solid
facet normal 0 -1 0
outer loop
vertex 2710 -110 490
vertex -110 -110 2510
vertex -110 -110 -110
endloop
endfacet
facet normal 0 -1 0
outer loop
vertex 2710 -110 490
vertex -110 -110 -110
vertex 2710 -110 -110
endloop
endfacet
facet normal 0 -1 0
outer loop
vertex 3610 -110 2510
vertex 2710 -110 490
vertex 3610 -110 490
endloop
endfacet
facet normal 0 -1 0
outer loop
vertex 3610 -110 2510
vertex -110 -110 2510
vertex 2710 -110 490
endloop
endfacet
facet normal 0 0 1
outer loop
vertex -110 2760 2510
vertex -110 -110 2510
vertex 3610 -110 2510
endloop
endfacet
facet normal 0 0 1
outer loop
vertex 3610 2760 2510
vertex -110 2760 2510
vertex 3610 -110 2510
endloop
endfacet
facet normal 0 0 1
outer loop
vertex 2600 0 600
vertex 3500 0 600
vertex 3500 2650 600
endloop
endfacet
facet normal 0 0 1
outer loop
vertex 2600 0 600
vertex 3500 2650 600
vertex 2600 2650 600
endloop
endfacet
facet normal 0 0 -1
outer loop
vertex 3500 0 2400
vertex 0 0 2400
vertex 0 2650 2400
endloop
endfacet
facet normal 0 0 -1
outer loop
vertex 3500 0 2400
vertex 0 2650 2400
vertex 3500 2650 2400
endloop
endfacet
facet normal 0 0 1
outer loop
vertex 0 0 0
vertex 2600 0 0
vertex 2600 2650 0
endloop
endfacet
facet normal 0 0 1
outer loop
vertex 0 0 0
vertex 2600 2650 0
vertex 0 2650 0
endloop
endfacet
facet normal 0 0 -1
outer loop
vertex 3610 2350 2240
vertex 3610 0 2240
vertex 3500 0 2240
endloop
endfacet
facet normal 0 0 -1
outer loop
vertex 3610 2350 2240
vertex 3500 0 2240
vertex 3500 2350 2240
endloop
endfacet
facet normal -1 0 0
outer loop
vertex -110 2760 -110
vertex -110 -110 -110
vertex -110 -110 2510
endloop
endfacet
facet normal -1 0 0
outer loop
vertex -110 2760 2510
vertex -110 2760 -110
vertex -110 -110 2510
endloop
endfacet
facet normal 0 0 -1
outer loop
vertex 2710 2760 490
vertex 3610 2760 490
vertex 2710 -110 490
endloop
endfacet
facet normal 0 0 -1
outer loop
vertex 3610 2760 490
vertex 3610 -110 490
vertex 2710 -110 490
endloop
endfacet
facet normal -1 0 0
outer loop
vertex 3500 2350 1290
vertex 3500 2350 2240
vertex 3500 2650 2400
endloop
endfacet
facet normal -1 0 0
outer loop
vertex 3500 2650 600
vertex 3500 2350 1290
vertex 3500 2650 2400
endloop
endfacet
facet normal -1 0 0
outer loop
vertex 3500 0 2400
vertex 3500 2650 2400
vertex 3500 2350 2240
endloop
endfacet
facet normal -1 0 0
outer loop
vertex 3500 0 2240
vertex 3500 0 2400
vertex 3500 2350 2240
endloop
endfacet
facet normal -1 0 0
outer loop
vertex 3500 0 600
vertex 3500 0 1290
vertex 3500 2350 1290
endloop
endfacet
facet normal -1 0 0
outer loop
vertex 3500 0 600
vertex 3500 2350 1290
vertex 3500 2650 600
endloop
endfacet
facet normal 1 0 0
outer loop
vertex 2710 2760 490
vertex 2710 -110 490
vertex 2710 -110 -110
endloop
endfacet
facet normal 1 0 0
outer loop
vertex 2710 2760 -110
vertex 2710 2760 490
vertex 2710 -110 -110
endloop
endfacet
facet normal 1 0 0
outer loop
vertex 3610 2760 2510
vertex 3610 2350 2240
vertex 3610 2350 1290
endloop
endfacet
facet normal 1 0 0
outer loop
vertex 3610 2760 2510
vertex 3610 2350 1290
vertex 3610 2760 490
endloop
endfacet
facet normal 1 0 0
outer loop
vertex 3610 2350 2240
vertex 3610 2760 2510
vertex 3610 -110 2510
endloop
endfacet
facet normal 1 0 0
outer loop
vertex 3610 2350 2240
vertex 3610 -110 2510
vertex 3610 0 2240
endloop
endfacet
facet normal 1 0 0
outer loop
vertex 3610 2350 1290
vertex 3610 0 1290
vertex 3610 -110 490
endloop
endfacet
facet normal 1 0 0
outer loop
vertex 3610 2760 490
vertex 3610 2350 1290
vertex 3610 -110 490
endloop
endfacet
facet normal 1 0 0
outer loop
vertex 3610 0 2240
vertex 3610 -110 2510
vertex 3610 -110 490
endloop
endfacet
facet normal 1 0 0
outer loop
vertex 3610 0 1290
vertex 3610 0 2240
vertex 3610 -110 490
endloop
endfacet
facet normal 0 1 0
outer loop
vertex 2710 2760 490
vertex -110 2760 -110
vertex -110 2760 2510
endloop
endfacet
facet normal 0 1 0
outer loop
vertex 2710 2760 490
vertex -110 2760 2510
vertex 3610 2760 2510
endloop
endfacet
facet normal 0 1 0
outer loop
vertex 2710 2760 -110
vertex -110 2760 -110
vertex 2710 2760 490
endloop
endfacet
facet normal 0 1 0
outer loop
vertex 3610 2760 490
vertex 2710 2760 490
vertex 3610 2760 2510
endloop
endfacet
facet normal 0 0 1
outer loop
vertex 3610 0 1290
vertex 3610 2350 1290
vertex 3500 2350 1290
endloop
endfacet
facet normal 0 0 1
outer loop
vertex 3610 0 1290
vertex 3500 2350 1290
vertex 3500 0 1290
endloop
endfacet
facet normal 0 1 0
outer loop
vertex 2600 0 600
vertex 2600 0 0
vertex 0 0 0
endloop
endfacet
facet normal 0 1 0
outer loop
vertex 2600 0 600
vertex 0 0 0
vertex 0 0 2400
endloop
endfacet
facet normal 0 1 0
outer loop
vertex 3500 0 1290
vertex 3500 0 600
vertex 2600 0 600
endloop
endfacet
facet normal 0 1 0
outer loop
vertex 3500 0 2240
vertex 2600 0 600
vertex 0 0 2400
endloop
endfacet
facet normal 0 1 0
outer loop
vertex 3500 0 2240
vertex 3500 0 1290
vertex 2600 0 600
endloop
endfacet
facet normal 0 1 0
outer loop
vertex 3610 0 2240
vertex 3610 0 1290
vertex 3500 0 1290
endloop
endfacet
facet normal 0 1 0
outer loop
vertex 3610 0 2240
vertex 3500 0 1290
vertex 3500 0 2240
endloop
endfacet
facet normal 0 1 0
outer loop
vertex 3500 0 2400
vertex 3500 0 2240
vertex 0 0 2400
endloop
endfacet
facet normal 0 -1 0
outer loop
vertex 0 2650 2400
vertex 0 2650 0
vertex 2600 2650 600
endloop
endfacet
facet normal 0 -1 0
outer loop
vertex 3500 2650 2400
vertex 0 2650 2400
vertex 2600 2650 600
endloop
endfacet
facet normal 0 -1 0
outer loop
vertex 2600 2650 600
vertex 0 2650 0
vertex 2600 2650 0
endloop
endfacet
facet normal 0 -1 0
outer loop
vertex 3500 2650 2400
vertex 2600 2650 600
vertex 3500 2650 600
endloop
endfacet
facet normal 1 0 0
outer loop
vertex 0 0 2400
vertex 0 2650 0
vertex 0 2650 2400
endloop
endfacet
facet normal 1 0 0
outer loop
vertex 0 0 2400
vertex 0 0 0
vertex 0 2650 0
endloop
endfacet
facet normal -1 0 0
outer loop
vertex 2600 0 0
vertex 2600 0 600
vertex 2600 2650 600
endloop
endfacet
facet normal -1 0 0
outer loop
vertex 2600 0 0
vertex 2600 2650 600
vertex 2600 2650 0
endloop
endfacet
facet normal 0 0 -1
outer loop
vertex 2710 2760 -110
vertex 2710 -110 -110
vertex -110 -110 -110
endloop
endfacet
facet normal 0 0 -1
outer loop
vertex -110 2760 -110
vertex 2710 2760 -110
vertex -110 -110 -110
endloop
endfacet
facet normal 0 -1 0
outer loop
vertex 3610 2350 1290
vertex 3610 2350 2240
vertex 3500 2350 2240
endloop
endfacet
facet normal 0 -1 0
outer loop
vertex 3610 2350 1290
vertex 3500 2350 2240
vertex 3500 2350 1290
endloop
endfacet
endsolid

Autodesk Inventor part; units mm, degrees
sketch "草图1" plane through (0, 0, 0) normal (0, 1, 0) x (-1, 0, 0)
  line L0 (0, 0) -> (0, 2400)
  line L1 (0, 2400) -> (-3500, 2400)
  line L2 (-3500, 2400) -> (-3500, 600)
  line L3 (-3500, 600) -> (-2600, 600)
  line L4 (-2600, 600) -> (-2600, 0)
  line L5 (-2600, 0) -> (0, 0)
  line L6 (110, 2510) -> (110, -110)
  line L7 (110, -110) -> (-2710, -110)
  line L8 (-2710, -110) -> (-2710, 490)
  line L9 (-2710, 490) -> (-3610, 490)
  line L10 (-3610, 490) -> (-3610, 2510)
  line L11 (-3610, 2510) -> (110, 2510)
  dimension "d0" = 2400
  dimension "d1" = 3500
  dimension "d2" = 1800
  dimension "d3" = 900
  dimension "d4" = 600
  dimension "d5" = 110
extrude "拉伸1" add sketch "草图1" along normal blind 2650
sketch "草图2" plane through (0, 0, 0) normal (0, -1, 0) x (1, 0, 0)
  line L0 (3610, 2510) -> (3610, 490) projected
  line L1 (-110, 2510) -> (3610, 2510) projected
  line L2 (-110, -110) -> (-110, 2510) projected
  line L3 (2710, -110) -> (-110, -110) projected
  line L4 (2710, 490) -> (2710, -110) projected
  line L5 (3610, 490) -> (2710, 490) projected
  point P0 (0, 0)
extrude "拉伸2" add sketch "草图2" along normal blind 110
sketch "草图3" plane through (0, 2650, 0) normal (0, 1, 0) x (1, 0, 0)
  line L0 (-110, 110) -> (-110, -2510) projected
  line L1 (-110, -2510) -> (3610, -2510) projected
  line L2 (3610, -2510) -> (3610, -490) projected
  line L3 (3610, -490) -> (2710, -490) projected
  line L4 (2710, -490) -> (2710, 110) projected
  line L5 (2710, 110) -> (-110, 110) projected
  point P0 (0, 0)
extrude "拉伸3" add sketch "草图3" along normal blind 110
sketch "草图4" plane through (3610, -110, 2510) normal (1, 0, 0) x (0, 0, -1)
  line L0 (270, 2460) -> (1220, 2460)
  line L1 (1220, 2460) -> (1220, 110)
  line L2 (1220, 110) -> (270, 110)
  line L3 (270, 110) -> (270, 2460)
  line L4 (2020, 0) -> (2020, 2870) projected
  line L5 (0, 2870) -> (2020, 2870) projected
  point P0 (2510, 110)
  dimension "d12" = 950
  dimension "d13" = 2350
  dimension "d14" = 800
  dimension "d15" = 410
extrude "拉伸4" cut sketch "草图4" against normal blind 110
sketch "草图5" plane through (0, 2760, 0) normal (0, 1, 0) x (1, 0, 0)
  line L0 (-110, -2510) -> (3610, -2510) projected
  line L1 (3610, -2510) -> (3610, -490) projected
  line L2 (3610, -490) -> (2710, -490) projected
  line L3 (2710, -490) -> (2710, 110) projected
  line L4 (2710, 110) -> (-110, 110) projected
  line L5 (-110, 110) -> (-110, -2510) projected
  point P0 (0, 0)
extrude "拉伸5" [suppressed]
ref_plane "工作平面1" through (2600, -110, 490) normal (1, 0, 0) x (0, 0, -1)
ref_plane "工作平面2" through (0, -110, -110) normal (-1, 0, 0) x (0, 0, 1)
ref_plane "工作平面3" through (2710, -110, 0) normal (0, 0, -1) x (-1, 0, 0)
ref_plane "工作平面4" through (0, 0, 0) normal (0, -1, 0) x (1, 0, 0)
ref_plane "工作平面5" through (-110, -110, 2400) normal (0, 0, 1) x (1, 0, 0)
ref_plane "工作平面6" through (1810, -110, 2510) normal (1, 0, 0) x (0, 0, -1)
ref_plane "工作平面7" through (0, 1500, 0) normal (0, -1, 0) x (1, 0, 0)
ref_plane "工作平面8" through (-110, -110, 1100) normal (0, 0, 1) x (1, 0, 0)
ref_plane "工作平面9" through (0, 2650, 0) normal (0, 1, 0) x (1, 0, 0)
ref_plane "工作平面10" through (3500, -110, 2510) normal (1, 0, 0) x (0, 0, -1)
sketch "草图6" plane through (3610, -110, 2510) normal (1, 0, 0) x (0, 0, -1)
  point P0 (2510, 110)
ref_plane "工作平面11" through (3610, -110, 2510) normal (1, 0, 0) x (0, 0, -1)
properties part number "room" material "混凝土"
